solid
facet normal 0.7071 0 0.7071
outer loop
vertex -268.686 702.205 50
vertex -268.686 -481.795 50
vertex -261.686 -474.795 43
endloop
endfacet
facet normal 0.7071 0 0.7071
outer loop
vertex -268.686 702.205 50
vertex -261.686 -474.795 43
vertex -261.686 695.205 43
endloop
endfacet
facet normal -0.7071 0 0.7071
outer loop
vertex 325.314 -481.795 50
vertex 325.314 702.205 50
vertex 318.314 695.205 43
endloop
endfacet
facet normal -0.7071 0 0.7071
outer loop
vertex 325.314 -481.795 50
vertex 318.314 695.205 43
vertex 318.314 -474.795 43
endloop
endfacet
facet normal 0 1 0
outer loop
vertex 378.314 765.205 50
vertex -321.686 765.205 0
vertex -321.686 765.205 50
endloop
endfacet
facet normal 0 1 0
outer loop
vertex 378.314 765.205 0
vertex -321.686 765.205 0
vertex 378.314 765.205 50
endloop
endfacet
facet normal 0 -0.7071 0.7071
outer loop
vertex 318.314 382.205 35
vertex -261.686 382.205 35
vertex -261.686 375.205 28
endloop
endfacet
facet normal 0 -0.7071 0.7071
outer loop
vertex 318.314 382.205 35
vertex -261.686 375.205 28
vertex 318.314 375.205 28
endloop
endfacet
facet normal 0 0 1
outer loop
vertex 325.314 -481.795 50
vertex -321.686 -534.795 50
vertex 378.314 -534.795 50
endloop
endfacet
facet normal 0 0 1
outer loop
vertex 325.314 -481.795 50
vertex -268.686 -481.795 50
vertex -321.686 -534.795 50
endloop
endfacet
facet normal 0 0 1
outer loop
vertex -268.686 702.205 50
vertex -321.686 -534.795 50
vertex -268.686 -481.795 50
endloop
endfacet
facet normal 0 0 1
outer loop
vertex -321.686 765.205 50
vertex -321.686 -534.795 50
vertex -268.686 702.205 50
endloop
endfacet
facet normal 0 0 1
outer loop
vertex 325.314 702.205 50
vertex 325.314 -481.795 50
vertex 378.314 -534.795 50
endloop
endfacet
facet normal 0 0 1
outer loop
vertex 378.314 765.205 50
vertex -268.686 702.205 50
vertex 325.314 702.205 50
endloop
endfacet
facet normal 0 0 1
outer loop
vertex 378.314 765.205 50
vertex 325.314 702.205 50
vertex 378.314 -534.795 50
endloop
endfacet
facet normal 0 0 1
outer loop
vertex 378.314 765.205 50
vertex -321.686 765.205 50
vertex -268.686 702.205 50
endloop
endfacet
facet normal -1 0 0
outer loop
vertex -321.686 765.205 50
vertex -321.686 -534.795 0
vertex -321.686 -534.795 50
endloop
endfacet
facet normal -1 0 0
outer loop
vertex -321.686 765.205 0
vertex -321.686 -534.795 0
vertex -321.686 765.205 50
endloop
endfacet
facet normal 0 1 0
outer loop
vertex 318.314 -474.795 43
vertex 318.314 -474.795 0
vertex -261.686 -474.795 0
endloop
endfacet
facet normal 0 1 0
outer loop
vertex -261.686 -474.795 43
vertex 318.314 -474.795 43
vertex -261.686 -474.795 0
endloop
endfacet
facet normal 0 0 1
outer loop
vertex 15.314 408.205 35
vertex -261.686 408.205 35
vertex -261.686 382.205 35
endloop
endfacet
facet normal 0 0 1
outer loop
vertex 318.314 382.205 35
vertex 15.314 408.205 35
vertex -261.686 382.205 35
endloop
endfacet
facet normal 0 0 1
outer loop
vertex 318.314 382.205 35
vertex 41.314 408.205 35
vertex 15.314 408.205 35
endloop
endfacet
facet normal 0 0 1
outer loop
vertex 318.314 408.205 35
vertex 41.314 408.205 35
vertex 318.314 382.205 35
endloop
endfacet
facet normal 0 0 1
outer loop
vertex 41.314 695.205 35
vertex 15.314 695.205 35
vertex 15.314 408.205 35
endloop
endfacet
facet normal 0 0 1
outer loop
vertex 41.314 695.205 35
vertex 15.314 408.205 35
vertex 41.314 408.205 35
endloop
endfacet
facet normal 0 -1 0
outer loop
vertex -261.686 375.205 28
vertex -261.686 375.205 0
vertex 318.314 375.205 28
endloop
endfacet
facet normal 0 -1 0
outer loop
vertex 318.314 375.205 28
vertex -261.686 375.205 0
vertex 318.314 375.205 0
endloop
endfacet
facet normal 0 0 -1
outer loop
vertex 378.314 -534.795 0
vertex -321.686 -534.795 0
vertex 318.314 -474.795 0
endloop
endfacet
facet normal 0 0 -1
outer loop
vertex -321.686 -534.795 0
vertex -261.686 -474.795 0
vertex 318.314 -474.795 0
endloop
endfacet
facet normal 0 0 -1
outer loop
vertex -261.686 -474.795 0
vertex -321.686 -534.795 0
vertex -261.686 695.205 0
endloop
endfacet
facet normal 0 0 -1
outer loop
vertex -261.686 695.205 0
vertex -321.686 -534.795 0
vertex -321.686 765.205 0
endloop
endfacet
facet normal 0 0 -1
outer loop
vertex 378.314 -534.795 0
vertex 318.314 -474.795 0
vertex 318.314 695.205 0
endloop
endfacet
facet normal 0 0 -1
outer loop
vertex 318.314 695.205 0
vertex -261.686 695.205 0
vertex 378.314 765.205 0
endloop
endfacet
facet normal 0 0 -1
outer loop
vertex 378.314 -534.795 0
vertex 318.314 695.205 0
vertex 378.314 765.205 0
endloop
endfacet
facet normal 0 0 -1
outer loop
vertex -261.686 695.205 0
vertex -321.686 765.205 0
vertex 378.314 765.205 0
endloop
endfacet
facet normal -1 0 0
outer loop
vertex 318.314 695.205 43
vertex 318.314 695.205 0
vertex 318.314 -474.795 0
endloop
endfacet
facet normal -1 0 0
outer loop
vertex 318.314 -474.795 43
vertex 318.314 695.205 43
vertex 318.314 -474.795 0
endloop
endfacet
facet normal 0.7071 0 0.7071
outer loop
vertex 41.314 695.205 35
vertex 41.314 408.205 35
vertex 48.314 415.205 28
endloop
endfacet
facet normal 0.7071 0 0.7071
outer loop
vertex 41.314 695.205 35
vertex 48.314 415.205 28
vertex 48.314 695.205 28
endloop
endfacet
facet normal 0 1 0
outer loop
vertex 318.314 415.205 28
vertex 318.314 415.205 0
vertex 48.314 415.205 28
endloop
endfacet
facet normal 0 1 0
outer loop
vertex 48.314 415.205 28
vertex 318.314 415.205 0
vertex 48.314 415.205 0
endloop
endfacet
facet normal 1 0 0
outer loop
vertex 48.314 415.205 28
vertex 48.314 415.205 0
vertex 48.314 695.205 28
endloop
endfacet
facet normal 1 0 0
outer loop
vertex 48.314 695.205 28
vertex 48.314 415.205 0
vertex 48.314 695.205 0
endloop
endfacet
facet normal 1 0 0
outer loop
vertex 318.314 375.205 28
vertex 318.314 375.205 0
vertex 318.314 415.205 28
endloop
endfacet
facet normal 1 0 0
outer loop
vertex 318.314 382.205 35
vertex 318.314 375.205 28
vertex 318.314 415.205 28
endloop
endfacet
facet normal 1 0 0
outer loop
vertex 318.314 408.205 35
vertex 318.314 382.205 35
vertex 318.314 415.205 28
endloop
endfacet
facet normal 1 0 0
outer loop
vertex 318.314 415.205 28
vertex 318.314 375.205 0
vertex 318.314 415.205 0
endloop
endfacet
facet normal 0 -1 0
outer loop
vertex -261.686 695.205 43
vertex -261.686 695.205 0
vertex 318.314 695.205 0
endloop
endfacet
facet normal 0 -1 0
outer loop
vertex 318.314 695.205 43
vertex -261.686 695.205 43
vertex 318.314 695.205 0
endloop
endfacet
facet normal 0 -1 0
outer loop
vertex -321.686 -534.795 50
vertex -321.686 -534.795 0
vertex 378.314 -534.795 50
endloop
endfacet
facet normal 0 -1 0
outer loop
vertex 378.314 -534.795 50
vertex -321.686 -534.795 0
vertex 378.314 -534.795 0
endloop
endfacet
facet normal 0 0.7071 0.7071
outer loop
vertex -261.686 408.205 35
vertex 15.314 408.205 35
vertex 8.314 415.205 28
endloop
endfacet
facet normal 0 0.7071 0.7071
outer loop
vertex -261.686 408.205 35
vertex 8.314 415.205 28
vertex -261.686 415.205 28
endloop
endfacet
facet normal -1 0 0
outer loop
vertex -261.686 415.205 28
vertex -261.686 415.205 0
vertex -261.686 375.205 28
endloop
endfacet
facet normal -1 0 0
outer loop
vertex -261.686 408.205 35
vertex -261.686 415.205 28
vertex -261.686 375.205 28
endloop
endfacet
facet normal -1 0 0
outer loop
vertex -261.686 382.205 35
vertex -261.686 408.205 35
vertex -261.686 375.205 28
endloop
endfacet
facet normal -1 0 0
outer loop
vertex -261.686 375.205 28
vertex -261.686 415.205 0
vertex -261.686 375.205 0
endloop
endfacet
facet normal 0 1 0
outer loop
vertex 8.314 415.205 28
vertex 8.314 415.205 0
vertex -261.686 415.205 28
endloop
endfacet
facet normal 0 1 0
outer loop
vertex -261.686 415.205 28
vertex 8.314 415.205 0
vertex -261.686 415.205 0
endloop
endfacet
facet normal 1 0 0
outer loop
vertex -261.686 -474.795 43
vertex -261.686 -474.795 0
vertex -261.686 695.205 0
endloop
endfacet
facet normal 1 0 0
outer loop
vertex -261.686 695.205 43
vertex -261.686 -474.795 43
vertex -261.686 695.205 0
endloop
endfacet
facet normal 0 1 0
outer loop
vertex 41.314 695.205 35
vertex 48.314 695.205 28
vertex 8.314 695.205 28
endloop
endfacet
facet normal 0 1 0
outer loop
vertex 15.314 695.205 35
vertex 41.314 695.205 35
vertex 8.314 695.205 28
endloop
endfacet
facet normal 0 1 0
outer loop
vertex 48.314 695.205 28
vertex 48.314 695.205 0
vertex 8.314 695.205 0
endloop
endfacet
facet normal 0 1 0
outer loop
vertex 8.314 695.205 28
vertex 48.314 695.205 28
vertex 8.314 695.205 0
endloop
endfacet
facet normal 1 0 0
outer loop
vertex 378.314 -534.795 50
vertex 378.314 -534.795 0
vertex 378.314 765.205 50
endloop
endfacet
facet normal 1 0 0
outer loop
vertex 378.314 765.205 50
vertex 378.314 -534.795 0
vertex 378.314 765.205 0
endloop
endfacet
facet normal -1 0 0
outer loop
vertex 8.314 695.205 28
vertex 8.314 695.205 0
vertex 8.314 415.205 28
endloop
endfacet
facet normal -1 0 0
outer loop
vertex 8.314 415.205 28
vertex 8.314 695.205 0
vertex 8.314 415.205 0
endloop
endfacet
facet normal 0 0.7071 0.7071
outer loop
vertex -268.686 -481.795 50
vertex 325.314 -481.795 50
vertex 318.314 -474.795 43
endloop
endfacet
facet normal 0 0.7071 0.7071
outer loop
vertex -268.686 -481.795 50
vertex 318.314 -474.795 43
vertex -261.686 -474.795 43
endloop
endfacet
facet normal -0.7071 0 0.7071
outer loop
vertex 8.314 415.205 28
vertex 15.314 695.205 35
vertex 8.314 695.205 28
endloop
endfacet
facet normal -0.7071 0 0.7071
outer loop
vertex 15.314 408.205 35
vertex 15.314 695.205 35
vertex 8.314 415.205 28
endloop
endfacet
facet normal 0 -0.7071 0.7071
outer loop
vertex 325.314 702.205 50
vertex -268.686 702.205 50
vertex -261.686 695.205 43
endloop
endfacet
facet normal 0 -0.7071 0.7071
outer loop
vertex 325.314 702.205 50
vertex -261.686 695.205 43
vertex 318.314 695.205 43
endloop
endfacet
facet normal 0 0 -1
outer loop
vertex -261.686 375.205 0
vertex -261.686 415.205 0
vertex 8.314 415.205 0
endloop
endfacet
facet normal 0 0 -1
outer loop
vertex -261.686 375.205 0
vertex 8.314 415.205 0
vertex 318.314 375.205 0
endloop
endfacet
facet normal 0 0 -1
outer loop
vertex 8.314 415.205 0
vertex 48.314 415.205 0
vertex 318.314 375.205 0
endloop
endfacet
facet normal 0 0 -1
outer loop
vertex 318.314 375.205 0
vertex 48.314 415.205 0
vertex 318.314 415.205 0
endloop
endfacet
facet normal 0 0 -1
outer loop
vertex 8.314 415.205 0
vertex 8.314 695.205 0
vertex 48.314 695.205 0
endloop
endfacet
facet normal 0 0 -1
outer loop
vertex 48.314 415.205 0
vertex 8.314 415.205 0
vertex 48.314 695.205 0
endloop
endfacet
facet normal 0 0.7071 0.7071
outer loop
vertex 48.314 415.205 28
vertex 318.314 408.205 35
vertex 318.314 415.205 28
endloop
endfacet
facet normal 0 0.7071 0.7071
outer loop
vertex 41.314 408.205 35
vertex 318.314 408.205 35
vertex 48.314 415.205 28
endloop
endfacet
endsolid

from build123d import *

# Parameters (mm, degrees)
F0_W      = 700
F0_H      = 1300
F1_DEPTH  = 50
F2_DEPTH  = 35
F3_SIZE   = 7
F3_2_SIZE = 7


# Not quite as in the source:
# - a feature names something its author has since deleted; it is built from what else it names


with BuildPart() as f1:
    # F0 (on Top) → F1 (new body)
    with BuildSketch(Plane.XY):
        with Locations((28.3141621128, 115.2047318473)):
            Rectangle(F0_W, F0_H)
        Polygon((-261.6858378872, 415.2047318473), (-261.6858378872, 695.2047318473), (8.3141621128, 695.2047318473), (48.3141621128, 695.2047318473), (318.3141621128, 695.2047318473), (318.3141621128, 415.2047318473), (318.3141621128, 375.2047318473), (318.3141621128, -474.7952681527), (-261.6858378872, -474.7952681527), (-261.6858378872, 375.2047318473), align=None, mode=Mode.SUBTRACT)
    extrude(amount=F1_DEPTH)

    # F3
    f3_edges = [f1.edges().sort_by_distance(p)[0] for p in [
        (-261.685838, 110.204732, 50),
        (318.314162, 110.204732, 50),
        (28.314162, 695.204732, 50),
        (28.314162, -474.795268, 50),
    ]]
    chamfer(f3_edges, length=F3_SIZE)


with BuildPart() as f2:
    # F0 (on Top) → F2 (new body)
    with BuildSketch(Plane.XY):
        Polygon((48.3141621128, 695.2047318473), (8.3141621128, 695.2047318473), (8.3141621128, 415.2047318473), (-261.6858378872, 415.2047318473), (-261.6858378872, 375.2047318473), (318.3141621128, 375.2047318473), (318.3141621128, 415.2047318473), (48.3141621128, 415.2047318473), align=None)
    extrude(amount=F2_DEPTH)

    # F3#2
    f3_2_edges = [f2.edges().sort_by_distance(p)[0] for p in [
        (8.314162, 555.204732, 35),
        (48.314162, 555.204732, 35),
        (-126.685838, 415.204732, 35),
        (183.314162, 415.204732, 35),
        (28.314162, 375.204732, 35),
    ]]
    chamfer(f3_2_edges, length=F3_2_SIZE)


solid = Compound([f1.part, f2.part])
